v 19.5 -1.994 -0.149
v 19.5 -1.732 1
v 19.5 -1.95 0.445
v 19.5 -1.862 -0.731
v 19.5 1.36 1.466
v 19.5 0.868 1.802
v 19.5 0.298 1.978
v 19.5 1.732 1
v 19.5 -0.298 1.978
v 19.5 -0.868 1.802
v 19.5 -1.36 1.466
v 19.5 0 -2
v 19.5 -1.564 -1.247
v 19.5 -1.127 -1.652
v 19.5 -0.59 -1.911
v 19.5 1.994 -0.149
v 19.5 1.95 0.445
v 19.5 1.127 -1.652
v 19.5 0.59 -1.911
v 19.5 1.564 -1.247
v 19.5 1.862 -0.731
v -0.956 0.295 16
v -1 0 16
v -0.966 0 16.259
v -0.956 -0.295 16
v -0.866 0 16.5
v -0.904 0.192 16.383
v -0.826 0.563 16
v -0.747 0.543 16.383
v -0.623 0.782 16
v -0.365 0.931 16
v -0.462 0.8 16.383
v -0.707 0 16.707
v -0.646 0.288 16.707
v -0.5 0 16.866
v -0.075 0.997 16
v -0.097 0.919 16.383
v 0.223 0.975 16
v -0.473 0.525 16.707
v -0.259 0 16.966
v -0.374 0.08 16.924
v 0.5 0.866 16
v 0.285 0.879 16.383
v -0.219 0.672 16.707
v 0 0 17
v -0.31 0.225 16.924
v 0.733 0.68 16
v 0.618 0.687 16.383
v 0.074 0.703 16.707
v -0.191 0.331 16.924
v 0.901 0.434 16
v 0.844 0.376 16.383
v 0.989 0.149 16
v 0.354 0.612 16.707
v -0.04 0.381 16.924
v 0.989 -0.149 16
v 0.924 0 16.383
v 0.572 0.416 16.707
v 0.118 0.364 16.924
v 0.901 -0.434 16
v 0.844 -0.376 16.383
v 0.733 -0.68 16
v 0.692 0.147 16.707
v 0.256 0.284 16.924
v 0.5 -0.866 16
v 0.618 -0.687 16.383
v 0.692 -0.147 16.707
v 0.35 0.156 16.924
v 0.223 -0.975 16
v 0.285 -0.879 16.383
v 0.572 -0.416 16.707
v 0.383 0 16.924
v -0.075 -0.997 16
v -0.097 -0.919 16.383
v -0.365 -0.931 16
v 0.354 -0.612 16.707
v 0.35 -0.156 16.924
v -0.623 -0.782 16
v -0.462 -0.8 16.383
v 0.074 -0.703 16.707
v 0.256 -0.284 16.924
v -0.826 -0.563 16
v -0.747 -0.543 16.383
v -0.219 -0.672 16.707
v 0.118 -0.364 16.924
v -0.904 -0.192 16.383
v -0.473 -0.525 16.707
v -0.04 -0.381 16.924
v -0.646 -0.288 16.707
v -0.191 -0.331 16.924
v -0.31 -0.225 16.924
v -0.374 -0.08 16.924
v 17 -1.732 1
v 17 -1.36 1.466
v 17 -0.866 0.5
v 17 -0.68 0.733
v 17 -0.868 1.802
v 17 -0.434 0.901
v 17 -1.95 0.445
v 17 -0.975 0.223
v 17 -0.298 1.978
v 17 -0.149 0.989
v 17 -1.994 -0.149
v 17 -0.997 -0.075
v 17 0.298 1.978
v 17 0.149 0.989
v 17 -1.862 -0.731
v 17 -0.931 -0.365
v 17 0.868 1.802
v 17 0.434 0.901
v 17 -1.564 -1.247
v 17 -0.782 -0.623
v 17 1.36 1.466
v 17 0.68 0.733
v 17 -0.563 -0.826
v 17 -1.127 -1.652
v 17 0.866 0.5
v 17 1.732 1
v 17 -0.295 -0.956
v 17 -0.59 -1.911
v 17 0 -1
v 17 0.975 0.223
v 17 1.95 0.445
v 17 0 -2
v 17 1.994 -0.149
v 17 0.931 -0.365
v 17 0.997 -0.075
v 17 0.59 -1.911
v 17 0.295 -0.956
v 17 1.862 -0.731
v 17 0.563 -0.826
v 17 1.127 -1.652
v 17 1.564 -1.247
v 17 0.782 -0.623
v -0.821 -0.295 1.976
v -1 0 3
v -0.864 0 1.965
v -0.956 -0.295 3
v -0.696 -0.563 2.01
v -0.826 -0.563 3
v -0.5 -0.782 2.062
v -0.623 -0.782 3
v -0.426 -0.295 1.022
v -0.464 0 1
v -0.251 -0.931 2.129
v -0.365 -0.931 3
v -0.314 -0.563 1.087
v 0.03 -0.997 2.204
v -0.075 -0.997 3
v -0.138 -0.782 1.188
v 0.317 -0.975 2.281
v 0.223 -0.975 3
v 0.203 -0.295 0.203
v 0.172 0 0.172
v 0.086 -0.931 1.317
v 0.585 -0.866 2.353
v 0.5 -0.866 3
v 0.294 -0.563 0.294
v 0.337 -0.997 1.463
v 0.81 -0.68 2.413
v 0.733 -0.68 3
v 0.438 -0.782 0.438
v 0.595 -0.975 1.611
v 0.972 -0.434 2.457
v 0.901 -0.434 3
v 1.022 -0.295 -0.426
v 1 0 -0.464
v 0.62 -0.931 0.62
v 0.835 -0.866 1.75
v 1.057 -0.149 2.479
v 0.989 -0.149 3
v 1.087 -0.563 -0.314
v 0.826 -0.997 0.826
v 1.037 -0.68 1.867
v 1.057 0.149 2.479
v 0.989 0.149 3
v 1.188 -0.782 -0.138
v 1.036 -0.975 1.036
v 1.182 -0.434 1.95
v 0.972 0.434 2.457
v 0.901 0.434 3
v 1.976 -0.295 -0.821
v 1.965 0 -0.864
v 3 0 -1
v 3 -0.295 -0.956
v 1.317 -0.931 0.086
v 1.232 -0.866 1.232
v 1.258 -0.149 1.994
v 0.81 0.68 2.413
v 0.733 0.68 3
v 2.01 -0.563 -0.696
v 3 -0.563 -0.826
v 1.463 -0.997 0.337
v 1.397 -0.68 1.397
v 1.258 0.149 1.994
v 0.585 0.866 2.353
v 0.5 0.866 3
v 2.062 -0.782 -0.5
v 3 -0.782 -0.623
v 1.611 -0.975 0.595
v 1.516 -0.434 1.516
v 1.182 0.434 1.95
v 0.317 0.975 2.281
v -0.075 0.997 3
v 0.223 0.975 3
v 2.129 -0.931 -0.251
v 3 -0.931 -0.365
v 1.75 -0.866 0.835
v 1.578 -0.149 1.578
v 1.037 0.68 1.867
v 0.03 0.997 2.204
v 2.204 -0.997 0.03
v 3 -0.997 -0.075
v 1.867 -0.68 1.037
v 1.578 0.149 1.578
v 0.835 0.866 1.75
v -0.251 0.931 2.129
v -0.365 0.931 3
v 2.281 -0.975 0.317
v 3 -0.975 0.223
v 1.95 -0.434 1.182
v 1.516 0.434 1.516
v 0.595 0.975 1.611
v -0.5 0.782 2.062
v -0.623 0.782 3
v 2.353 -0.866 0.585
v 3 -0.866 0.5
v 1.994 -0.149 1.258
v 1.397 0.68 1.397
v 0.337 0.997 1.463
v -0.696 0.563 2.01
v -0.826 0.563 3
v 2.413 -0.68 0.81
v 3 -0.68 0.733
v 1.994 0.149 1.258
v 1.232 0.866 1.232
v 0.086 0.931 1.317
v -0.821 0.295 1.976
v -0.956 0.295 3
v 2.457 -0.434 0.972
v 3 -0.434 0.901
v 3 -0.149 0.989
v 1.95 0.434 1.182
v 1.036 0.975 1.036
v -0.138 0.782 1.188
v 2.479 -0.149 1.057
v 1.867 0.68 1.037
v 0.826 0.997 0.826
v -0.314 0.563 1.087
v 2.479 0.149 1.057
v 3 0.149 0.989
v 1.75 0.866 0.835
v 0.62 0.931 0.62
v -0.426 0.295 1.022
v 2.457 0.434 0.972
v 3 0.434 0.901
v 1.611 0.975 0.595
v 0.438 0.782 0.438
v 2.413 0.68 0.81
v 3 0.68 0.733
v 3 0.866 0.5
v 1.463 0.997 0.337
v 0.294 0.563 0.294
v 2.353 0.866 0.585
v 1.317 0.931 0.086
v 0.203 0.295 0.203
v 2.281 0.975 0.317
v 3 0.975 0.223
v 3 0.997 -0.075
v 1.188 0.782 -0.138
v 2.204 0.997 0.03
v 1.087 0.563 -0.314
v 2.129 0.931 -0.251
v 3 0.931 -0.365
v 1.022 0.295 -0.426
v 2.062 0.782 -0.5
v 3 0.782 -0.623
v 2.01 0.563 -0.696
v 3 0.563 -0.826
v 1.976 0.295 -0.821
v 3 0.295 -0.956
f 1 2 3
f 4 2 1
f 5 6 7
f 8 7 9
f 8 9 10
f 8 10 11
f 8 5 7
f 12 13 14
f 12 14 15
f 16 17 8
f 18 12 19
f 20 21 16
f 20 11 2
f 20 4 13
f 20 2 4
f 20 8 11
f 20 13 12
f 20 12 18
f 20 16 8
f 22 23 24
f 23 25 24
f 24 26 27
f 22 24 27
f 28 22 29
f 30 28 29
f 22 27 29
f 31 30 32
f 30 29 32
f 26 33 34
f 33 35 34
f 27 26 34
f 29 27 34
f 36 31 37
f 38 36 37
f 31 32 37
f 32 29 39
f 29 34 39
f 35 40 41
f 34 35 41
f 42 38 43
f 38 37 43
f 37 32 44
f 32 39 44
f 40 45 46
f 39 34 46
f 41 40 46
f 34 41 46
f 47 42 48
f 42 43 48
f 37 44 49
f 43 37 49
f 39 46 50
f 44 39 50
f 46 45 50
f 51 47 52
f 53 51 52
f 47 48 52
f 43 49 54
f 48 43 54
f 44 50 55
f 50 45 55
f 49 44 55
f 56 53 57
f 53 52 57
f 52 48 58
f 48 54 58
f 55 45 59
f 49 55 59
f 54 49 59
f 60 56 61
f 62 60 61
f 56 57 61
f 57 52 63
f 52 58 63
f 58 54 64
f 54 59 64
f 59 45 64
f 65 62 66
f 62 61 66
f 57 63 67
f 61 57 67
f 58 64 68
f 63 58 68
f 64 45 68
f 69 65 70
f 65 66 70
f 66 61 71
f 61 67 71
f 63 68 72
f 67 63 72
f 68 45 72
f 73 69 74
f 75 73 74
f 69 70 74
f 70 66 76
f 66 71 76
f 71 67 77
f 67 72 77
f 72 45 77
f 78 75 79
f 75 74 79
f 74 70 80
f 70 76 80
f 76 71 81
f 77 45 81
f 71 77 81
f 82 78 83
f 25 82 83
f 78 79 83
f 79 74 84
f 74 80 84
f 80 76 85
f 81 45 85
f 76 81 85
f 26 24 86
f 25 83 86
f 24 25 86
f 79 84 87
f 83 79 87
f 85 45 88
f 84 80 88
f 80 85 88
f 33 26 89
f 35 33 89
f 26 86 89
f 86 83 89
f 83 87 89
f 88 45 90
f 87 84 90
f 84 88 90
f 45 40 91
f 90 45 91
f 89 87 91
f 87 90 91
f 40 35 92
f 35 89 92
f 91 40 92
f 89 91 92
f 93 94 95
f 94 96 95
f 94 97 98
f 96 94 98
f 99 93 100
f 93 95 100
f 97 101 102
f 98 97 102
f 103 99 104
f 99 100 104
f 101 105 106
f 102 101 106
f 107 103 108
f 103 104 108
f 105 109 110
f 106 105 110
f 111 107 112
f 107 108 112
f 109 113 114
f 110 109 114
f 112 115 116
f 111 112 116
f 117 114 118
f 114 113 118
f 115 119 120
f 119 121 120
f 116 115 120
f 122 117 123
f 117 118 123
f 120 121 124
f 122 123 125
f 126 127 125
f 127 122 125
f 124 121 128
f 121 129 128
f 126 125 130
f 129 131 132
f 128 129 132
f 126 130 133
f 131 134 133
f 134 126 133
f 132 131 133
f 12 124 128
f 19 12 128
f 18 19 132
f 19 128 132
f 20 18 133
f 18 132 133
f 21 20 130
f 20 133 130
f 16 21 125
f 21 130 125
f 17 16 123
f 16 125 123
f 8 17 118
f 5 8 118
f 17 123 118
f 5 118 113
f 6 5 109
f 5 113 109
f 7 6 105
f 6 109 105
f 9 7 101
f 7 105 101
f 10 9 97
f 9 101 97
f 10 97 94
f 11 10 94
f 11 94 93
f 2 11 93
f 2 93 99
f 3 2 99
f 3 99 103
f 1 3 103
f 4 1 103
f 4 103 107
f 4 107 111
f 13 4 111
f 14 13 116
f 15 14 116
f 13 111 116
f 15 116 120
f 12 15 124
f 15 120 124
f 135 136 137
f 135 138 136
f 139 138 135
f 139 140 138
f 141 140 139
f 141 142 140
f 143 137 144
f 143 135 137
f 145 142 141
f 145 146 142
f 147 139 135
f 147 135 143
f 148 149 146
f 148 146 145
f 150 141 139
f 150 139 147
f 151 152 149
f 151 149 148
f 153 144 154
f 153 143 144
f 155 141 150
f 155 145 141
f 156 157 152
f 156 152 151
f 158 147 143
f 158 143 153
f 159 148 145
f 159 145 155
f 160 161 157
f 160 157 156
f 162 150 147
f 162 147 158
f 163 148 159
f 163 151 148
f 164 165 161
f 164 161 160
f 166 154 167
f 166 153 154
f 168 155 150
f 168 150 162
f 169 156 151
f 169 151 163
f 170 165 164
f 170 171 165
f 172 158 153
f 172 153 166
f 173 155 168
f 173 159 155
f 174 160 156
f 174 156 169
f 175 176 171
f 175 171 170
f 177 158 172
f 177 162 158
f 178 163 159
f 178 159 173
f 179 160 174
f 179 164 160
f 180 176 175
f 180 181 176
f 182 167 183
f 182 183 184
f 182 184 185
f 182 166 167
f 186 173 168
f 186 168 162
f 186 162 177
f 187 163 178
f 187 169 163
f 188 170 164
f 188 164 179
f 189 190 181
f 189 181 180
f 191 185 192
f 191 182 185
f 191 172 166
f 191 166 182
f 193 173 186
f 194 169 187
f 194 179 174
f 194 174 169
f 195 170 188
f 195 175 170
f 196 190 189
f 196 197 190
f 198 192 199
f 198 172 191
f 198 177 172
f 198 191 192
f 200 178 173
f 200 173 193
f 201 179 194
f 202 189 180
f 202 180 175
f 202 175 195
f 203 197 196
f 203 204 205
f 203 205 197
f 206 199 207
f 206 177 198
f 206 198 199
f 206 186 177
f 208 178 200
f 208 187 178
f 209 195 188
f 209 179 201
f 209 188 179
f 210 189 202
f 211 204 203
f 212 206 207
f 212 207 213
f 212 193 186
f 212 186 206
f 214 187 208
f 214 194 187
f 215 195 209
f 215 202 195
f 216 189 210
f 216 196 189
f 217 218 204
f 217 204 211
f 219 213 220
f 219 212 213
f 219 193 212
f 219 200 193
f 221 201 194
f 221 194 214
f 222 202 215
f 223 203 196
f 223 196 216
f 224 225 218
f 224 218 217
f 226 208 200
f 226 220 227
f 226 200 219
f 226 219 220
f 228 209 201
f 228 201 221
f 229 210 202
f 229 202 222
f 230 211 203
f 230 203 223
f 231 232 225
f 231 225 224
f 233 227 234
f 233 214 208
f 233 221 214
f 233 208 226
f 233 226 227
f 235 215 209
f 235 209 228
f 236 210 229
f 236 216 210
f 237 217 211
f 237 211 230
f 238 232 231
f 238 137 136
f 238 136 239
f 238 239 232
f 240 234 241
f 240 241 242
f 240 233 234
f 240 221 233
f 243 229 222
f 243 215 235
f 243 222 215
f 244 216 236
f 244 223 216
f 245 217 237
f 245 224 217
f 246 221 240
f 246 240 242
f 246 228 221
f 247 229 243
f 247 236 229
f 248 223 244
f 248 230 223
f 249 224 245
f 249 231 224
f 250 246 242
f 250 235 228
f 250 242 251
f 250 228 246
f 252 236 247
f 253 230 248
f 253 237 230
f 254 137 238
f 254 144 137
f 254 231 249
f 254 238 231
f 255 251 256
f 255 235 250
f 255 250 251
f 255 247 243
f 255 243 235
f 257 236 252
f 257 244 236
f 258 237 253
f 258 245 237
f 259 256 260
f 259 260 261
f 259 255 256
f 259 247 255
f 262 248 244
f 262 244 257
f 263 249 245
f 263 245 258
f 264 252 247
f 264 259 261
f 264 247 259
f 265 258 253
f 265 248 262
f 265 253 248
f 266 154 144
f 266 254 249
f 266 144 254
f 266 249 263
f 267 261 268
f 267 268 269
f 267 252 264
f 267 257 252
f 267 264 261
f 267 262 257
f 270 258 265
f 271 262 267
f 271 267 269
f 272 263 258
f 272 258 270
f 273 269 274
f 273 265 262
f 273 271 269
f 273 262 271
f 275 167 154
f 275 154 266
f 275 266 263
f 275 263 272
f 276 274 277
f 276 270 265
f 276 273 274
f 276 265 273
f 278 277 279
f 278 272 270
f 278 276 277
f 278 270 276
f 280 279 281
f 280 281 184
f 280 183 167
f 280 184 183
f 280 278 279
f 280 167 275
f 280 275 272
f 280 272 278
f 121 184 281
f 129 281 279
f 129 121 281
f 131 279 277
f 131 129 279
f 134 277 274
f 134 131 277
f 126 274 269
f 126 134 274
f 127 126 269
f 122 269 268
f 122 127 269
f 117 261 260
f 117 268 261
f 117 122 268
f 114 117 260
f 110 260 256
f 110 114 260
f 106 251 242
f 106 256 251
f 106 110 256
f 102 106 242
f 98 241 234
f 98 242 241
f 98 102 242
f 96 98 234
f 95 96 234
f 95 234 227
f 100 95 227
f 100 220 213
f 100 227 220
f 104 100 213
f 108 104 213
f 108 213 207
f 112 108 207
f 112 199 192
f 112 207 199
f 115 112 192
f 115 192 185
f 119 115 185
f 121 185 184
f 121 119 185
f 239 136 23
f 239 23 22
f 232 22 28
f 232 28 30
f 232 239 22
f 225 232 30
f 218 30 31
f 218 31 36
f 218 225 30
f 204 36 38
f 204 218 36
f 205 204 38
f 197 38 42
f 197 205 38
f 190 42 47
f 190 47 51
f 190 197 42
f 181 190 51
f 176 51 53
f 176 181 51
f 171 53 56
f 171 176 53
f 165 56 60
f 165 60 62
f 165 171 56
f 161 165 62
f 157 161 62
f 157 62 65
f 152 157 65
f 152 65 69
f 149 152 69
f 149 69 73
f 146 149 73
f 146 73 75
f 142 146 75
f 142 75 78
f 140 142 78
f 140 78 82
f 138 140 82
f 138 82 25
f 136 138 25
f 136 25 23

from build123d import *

# Parameters (mm, degrees)
SKETCH2_R           = 1
FILLET1_R           = 1
SKETCH3_R           = 2
BOSS_EXTRUDE1_DEPTH = 2.5


with BuildPart() as part:
    # Sweep2: sweep along a path in Sketch1
    with BuildLine(Plane(origin=(0, 0, 0), x_dir=(1, 0, 0), z_dir=(0, 1, 0))) as sweep2_path:
        Line((0, -17), (0, -3))
        ThreePointArc((0, -3), (0.878679656, -0.878679656), (3, 0))
        Line((3, 0), (17, 0))
    # Sketch2 → Sweep2 (sweep)
    with BuildSketch(Plane(origin=(17, 0, 0), x_dir=(0, 0, -1), z_dir=(1, 0, 0))):
        Circle(SKETCH2_R)
    sweep(path=sweep2_path.line)

    # Fillet1
    fillet1_edges = [part.edges().sort_by_distance(p)[0] for p in [
        (1, 0, 17),
    ]]
    fillet(fillet1_edges, radius=FILLET1_R)

    # Sketch3 → Boss-Extrude1 (add)
    with BuildSketch(Plane(origin=(17, 0, 0), x_dir=(0, 0, -1), z_dir=(1, 0, 0))):
        Circle(SKETCH3_R)
    extrude(amount=BOSS_EXTRUDE1_DEPTH)


solid = part.part
